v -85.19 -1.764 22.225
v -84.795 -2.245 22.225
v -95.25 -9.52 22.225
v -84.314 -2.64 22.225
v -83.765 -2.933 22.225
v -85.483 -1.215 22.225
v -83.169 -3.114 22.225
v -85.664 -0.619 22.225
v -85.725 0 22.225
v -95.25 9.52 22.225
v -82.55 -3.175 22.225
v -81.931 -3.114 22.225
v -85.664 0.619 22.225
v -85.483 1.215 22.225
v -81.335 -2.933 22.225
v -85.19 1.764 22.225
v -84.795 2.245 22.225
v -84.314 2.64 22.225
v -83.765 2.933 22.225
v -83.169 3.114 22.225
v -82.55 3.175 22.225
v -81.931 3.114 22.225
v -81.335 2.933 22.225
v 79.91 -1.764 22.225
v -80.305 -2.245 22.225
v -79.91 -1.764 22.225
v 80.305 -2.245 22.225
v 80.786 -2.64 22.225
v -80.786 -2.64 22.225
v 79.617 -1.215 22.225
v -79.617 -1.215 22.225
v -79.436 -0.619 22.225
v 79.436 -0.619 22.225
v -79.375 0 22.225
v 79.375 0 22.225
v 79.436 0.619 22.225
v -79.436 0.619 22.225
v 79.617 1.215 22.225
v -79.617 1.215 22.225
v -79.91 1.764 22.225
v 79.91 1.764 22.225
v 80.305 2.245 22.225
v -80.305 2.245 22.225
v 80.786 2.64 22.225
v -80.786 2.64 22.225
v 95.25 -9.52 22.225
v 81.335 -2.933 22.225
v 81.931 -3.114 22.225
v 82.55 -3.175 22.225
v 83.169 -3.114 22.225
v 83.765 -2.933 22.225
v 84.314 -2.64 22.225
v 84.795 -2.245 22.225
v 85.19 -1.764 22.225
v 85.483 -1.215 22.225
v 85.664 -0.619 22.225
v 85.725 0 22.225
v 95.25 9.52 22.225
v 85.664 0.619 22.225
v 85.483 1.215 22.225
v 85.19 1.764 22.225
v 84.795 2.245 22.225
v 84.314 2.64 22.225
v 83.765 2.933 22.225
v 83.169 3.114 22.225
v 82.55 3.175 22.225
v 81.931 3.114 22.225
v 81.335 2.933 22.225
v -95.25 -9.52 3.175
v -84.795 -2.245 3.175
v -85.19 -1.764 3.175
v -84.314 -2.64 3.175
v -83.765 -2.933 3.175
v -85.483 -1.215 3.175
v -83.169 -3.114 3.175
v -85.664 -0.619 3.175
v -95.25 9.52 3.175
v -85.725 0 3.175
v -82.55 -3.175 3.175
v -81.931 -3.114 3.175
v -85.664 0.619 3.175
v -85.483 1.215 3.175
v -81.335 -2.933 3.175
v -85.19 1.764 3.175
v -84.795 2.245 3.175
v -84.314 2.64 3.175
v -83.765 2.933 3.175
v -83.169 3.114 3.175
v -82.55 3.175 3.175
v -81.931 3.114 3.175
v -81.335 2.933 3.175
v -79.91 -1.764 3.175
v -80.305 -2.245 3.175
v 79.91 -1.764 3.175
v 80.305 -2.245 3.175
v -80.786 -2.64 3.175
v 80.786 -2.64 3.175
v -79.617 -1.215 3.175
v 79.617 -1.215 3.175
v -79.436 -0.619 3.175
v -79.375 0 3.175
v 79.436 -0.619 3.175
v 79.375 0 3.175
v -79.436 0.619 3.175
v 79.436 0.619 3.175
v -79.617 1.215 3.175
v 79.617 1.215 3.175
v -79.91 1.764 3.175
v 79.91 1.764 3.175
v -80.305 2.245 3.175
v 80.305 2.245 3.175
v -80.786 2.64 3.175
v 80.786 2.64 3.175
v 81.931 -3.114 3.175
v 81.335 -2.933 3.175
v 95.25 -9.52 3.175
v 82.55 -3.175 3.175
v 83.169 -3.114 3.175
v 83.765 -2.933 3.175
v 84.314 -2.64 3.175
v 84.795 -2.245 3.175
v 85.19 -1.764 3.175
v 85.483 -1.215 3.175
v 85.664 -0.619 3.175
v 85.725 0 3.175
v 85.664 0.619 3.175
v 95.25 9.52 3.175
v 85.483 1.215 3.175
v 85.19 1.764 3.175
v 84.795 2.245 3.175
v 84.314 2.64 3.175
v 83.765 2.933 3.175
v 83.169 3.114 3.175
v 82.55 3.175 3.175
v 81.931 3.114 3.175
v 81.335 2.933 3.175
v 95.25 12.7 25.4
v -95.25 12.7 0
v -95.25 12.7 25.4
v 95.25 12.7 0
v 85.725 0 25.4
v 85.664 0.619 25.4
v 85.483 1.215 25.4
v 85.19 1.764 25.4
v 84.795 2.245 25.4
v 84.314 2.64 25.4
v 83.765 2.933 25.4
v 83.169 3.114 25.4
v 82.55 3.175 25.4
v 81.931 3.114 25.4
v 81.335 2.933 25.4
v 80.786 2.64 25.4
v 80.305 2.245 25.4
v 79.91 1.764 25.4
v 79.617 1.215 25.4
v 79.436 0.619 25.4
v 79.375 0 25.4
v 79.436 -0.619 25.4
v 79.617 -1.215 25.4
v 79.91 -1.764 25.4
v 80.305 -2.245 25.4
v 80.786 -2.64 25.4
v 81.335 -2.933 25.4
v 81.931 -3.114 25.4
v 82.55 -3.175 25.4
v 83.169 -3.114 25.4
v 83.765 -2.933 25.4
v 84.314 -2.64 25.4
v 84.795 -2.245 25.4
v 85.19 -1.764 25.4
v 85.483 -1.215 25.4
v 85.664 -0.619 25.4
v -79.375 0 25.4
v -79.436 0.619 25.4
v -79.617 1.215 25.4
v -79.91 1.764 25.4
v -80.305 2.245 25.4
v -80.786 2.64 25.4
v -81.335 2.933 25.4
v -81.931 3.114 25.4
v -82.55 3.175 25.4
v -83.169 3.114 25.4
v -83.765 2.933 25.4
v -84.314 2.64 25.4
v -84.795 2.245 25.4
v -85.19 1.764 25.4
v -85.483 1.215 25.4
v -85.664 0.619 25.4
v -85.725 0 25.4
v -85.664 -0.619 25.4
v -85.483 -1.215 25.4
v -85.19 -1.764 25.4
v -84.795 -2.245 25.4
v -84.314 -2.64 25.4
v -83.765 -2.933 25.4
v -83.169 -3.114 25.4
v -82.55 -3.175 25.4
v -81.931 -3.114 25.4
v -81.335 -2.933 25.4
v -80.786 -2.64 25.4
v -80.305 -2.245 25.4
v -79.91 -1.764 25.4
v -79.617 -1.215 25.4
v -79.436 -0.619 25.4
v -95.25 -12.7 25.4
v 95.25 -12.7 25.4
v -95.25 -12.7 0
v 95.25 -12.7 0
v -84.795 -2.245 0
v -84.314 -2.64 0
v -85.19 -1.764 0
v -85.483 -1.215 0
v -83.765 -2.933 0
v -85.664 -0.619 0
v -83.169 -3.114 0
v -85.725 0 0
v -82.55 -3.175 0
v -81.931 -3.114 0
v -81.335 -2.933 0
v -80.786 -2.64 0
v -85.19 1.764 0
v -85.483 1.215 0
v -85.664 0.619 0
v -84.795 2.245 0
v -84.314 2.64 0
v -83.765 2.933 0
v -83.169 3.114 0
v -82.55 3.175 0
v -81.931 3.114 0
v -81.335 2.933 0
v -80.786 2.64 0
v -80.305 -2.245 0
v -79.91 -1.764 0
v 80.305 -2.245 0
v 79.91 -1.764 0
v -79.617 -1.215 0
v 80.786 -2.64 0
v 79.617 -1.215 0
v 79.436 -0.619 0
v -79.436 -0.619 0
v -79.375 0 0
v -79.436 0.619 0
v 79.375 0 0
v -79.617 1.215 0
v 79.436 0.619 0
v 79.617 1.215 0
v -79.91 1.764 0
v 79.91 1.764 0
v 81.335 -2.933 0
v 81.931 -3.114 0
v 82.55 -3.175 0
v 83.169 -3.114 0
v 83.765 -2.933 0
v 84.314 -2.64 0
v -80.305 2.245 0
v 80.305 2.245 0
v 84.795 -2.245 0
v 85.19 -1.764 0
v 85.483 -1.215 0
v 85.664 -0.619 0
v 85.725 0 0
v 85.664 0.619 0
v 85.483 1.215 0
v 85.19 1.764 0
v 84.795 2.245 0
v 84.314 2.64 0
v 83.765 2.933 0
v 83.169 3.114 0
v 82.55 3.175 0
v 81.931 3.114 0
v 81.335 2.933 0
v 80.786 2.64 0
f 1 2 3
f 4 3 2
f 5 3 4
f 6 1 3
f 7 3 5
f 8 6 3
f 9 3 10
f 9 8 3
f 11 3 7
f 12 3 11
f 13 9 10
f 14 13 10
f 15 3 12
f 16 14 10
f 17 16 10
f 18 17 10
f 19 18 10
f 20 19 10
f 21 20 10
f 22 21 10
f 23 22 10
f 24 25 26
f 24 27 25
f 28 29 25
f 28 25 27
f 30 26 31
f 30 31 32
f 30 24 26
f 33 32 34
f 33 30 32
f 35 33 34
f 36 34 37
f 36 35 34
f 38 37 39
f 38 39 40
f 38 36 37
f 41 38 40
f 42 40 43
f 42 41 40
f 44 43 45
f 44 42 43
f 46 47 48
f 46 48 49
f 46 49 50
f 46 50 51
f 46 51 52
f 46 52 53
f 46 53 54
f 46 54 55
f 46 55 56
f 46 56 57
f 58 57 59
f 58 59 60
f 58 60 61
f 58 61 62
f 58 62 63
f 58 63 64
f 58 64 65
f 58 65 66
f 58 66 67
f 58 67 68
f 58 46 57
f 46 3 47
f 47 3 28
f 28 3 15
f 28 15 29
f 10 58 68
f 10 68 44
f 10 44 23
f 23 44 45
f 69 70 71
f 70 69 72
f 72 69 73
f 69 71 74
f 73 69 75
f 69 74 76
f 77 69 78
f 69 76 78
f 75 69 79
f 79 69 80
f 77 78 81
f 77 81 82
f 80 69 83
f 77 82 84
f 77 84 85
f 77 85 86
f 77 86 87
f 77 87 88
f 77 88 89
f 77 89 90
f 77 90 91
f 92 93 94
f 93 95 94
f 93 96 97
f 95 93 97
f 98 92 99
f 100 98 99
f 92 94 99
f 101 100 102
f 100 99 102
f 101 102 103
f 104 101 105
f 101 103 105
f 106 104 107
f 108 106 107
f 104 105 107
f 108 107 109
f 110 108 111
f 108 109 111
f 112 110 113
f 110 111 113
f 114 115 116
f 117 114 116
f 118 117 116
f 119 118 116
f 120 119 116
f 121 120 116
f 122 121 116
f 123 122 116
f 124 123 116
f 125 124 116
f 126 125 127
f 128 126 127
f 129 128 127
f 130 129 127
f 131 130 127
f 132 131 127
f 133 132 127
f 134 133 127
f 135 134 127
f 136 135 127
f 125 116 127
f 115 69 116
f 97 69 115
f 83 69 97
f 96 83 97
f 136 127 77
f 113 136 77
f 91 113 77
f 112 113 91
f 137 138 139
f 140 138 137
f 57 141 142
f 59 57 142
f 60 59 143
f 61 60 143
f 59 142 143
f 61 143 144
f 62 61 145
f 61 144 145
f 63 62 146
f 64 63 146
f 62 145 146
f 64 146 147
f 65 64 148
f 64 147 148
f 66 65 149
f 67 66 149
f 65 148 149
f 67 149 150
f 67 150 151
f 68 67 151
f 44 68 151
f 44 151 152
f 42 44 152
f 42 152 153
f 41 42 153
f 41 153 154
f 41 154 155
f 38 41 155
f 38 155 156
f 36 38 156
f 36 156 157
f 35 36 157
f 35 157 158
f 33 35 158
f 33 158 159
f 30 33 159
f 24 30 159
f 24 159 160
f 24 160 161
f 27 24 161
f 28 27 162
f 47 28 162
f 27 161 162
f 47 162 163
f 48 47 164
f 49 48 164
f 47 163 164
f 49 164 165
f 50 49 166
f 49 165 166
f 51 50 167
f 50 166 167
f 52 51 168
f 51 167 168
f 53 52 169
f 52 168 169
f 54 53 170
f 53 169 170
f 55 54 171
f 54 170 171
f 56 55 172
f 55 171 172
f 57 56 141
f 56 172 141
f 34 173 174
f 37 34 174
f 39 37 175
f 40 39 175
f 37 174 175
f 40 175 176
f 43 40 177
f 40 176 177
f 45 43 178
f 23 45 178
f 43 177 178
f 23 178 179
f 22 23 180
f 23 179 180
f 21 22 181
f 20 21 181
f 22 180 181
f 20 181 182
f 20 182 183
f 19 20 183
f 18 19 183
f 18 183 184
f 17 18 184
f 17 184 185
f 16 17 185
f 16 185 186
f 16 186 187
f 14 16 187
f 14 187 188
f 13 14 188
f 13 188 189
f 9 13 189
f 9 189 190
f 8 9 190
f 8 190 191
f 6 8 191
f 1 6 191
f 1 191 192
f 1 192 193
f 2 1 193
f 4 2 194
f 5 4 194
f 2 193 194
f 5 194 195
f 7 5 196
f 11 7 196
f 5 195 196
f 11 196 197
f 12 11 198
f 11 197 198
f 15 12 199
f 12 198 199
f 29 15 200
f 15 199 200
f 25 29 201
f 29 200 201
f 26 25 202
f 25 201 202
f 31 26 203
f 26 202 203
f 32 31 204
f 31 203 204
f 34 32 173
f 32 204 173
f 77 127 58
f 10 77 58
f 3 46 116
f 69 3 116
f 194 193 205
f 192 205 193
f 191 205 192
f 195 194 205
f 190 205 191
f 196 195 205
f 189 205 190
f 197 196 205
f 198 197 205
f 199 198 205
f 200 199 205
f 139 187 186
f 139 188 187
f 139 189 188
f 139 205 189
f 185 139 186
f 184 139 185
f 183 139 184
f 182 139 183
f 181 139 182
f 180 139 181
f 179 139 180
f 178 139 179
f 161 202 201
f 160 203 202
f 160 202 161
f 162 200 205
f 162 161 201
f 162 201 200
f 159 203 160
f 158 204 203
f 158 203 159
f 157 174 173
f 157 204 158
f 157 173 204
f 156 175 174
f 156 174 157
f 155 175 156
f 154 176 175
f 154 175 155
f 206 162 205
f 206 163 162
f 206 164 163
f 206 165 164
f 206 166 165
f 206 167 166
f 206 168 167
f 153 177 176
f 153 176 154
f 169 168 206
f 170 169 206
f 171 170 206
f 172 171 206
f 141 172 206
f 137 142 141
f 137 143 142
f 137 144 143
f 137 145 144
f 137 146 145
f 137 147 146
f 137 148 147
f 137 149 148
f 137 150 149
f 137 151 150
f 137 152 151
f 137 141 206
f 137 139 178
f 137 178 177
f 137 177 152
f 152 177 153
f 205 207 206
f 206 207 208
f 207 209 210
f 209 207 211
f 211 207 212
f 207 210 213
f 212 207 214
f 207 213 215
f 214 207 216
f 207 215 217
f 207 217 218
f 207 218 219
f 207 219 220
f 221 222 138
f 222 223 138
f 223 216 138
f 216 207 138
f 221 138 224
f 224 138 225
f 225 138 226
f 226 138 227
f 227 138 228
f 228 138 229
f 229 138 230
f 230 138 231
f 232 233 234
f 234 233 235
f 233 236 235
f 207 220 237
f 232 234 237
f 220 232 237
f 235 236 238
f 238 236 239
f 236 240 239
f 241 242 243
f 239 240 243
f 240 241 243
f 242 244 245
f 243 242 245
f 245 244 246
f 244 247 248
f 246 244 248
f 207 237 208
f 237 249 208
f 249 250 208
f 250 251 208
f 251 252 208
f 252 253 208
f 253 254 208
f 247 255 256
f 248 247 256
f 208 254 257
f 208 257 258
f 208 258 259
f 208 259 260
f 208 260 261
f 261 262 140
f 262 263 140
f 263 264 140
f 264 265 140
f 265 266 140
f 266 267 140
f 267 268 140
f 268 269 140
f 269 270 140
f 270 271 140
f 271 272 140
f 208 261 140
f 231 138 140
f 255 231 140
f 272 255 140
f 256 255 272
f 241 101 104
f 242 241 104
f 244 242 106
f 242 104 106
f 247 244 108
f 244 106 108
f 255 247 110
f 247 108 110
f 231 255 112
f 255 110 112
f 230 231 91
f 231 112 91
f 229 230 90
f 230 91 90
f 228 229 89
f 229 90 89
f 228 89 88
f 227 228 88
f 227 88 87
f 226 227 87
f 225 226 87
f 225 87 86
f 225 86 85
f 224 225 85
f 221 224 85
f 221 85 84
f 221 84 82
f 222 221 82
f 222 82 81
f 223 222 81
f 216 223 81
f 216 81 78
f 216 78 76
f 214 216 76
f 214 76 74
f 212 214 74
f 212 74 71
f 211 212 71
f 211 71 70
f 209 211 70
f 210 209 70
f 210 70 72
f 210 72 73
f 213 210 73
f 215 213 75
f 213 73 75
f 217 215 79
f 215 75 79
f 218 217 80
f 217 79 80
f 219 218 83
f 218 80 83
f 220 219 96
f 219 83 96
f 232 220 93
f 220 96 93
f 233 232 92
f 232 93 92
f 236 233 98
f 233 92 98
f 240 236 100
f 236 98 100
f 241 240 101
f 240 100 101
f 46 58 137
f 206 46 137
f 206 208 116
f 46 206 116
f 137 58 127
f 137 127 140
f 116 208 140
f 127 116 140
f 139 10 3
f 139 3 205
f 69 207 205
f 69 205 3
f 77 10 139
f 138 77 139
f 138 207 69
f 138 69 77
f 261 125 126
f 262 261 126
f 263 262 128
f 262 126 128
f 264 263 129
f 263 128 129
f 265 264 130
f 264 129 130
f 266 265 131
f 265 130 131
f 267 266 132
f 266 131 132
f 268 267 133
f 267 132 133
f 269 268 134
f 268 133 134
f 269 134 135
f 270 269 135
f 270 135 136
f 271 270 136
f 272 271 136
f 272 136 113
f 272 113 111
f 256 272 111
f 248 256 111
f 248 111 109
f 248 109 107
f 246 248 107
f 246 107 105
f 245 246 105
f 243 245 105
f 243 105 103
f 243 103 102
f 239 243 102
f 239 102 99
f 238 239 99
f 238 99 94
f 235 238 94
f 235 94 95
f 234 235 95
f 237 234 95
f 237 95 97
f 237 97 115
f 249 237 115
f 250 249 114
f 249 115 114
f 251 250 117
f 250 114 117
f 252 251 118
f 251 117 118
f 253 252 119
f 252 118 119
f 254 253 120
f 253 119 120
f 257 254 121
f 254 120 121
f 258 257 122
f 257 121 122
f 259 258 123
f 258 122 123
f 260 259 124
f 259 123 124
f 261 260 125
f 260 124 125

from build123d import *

# Parameters (mm, degrees)
SKETCH1_W           = 190.5
SKETCH1_H           = 25.4
BOSS_EXTRUDE1_DEPTH = 25.4
SKETCH2_W           = 9.525
SKETCH2_H           = 19.040717284
CUT_EXTRUDE1_DEPTH  = 508
SKETCH4_R           = 3.175
CUT_EXTRUDE3_DEPTH  = 508


with BuildPart() as part:
    # Sketch1 → Boss-Extrude1 (new body)
    with BuildSketch(Plane.XY):
        Rectangle(SKETCH1_W, SKETCH1_H)
    extrude(amount=BOSS_EXTRUDE1_DEPTH)

    # Sketch2 → Cut-Extrude1 (cut)
    with BuildSketch(Plane(origin=(95.25, 0, 0), x_dir=(0, 0, -1), z_dir=(1, 0, 0))):
        with Locations((-17.4625, 0)):
            Rectangle(SKETCH2_W, SKETCH2_H)
        with Locations((-7.9375, 0)):
            Rectangle(SKETCH2_W, SKETCH2_H)
    extrude(amount=-CUT_EXTRUDE1_DEPTH, mode=Mode.SUBTRACT)

    # Sketch4 → Cut-Extrude3 (cut)
    with BuildSketch(Plane.XY.offset(25.4)):
        with Locations((-82.55, 0)):
            Circle(SKETCH4_R)
        with Locations((82.55, 0)):
            Circle(SKETCH4_R)
    extrude(amount=-CUT_EXTRUDE3_DEPTH, mode=Mode.SUBTRACT)


solid = part.part
